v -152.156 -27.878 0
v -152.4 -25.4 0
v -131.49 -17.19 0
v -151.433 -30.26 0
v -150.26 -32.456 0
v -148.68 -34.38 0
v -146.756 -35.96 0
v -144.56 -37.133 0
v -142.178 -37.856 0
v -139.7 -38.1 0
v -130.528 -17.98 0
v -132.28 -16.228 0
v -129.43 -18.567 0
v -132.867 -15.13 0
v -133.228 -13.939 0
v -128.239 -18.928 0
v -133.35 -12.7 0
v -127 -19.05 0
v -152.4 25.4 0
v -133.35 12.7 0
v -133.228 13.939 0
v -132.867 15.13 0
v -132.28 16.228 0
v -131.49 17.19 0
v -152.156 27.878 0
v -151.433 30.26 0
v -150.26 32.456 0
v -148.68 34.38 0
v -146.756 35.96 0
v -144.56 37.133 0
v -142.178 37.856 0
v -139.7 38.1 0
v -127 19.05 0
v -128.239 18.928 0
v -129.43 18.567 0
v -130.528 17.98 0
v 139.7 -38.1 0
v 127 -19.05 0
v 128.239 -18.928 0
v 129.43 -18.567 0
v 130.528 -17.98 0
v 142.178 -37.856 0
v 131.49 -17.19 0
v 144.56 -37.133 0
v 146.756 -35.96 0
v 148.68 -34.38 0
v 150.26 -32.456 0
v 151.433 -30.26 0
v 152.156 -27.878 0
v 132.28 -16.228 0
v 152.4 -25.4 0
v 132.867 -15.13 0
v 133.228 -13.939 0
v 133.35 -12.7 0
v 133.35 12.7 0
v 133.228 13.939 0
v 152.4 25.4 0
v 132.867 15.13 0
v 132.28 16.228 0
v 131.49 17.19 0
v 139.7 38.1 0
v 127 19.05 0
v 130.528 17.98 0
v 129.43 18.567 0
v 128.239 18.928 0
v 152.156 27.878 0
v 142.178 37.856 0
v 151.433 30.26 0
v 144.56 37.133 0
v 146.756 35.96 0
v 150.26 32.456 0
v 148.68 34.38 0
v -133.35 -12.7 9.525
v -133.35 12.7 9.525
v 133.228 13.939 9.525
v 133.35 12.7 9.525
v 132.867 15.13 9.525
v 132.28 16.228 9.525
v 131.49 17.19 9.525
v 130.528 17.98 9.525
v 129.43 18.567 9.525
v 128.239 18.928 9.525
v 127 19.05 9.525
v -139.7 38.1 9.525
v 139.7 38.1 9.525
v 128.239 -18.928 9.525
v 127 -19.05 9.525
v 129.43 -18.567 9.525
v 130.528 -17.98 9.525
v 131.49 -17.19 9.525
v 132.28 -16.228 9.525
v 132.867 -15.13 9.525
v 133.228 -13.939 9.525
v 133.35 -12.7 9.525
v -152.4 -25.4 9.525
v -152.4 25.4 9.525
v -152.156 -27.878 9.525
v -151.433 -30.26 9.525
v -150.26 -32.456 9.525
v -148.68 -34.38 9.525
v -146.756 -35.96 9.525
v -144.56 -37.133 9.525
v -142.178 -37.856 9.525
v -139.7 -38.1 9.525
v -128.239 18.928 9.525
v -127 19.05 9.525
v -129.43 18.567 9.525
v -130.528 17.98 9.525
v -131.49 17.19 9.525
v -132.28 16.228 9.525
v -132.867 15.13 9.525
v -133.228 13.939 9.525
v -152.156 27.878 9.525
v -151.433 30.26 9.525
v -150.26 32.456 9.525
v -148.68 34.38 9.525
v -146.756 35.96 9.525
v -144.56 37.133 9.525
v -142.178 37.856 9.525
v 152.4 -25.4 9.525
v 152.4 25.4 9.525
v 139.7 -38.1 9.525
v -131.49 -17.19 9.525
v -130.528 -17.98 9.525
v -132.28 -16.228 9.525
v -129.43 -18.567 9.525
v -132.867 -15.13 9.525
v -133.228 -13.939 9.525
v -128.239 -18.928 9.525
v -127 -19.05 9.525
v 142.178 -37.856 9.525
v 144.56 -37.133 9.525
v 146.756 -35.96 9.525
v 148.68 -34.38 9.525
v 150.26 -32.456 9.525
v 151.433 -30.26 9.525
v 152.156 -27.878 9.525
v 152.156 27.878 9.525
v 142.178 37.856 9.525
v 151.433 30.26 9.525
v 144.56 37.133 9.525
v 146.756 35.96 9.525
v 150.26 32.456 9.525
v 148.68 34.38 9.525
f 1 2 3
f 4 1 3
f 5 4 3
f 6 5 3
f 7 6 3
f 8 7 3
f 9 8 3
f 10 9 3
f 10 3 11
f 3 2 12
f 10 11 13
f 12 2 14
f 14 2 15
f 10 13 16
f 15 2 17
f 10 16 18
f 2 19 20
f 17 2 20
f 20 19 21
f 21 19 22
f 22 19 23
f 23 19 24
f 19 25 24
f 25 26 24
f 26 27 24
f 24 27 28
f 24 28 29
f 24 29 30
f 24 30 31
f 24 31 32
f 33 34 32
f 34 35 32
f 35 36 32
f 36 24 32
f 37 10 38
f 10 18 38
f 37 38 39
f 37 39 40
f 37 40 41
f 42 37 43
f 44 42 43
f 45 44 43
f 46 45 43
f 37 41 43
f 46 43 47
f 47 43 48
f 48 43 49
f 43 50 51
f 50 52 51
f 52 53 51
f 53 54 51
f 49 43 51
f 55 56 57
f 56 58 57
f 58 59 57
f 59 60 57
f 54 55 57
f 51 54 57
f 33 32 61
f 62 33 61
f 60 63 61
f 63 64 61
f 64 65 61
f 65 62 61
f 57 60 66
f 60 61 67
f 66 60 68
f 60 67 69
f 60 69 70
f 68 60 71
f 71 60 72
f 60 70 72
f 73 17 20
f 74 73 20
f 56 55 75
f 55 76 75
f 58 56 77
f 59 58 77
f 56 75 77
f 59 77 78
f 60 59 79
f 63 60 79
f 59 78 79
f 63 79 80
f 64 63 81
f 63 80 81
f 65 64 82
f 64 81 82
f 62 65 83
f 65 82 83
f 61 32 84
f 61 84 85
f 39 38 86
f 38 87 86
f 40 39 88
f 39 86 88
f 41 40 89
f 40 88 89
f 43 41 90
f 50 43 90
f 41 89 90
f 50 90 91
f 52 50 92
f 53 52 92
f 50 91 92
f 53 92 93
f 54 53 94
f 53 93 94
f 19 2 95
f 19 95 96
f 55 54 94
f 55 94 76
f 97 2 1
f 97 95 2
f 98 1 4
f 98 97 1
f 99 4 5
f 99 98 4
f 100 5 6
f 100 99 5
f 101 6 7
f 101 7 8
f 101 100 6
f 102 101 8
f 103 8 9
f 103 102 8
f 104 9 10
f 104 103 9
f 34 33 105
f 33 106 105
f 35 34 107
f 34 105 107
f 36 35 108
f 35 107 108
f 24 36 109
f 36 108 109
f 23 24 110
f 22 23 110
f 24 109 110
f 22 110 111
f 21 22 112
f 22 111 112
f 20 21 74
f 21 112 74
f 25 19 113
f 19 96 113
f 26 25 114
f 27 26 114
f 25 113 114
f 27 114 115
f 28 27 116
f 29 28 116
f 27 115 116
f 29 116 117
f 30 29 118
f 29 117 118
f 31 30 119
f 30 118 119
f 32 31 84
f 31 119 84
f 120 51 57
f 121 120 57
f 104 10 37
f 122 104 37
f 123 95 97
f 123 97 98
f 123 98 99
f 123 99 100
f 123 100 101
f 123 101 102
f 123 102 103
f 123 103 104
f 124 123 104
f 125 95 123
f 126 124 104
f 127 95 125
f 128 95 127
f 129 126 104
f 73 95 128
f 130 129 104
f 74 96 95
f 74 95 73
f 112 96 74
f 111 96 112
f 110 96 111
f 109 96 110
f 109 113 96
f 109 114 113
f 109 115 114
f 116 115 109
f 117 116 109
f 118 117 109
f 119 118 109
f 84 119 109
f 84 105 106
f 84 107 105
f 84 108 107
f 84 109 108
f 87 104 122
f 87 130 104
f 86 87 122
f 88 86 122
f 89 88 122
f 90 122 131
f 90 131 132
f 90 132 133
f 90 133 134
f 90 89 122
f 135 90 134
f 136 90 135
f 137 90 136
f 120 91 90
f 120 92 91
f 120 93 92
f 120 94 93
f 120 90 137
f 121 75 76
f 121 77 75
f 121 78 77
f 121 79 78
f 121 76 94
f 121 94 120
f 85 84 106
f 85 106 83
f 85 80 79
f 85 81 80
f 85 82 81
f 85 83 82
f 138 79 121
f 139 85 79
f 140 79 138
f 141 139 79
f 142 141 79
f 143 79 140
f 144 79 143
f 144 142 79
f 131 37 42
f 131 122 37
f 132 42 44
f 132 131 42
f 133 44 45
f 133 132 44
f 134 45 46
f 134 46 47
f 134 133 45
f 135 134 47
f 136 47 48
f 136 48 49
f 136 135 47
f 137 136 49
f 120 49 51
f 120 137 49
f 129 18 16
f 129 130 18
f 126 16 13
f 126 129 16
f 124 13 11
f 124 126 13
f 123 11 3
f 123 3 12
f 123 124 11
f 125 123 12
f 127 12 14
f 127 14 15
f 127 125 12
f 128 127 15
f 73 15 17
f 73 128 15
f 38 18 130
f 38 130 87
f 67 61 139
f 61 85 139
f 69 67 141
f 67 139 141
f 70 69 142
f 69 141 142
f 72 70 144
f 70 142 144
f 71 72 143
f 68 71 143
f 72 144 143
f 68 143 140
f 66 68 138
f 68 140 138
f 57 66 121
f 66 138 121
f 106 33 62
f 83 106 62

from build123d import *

# Parameters (mm, degrees)
SKETCH1_W           = 304.8
SKETCH1_H           = 76.2
SKETCH1_W_2         = 266.7
SKETCH1_H_2         = 38.1
BOSS_EXTRUDE1_DEPTH = 9.525
FILLET1_R           = 12.7
FILLET2_R           = 6.35


with BuildPart() as part:
    # Sketch1 → Boss-Extrude1 (new body)
    with BuildSketch(Plane.XY):
        Rectangle(SKETCH1_W, SKETCH1_H)
        Rectangle(SKETCH1_W_2, SKETCH1_H_2, mode=Mode.SUBTRACT)
    extrude(amount=BOSS_EXTRUDE1_DEPTH)

    # Fillet1
    fillet1_edges = [part.edges().sort_by_distance(p)[0] for p in [
        (152.4, -38.1, 4.7625),
        (-152.4, -38.1, 4.7625),
        (-152.4, 38.1, 4.7625),
        (152.4, 38.1, 4.7625),
    ]]
    fillet(fillet1_edges, radius=FILLET1_R)

    # Fillet2
    fillet2_edges = [part.edges().sort_by_distance(p)[0] for p in [
        (133.35, -19.05, 4.7625),
        (133.35, 19.05, 4.7625),
        (-133.35, 19.05, 4.7625),
        (-133.35, -19.05, 4.7625),
    ]]
    fillet(fillet2_edges, radius=FILLET2_R)


solid = part.part
